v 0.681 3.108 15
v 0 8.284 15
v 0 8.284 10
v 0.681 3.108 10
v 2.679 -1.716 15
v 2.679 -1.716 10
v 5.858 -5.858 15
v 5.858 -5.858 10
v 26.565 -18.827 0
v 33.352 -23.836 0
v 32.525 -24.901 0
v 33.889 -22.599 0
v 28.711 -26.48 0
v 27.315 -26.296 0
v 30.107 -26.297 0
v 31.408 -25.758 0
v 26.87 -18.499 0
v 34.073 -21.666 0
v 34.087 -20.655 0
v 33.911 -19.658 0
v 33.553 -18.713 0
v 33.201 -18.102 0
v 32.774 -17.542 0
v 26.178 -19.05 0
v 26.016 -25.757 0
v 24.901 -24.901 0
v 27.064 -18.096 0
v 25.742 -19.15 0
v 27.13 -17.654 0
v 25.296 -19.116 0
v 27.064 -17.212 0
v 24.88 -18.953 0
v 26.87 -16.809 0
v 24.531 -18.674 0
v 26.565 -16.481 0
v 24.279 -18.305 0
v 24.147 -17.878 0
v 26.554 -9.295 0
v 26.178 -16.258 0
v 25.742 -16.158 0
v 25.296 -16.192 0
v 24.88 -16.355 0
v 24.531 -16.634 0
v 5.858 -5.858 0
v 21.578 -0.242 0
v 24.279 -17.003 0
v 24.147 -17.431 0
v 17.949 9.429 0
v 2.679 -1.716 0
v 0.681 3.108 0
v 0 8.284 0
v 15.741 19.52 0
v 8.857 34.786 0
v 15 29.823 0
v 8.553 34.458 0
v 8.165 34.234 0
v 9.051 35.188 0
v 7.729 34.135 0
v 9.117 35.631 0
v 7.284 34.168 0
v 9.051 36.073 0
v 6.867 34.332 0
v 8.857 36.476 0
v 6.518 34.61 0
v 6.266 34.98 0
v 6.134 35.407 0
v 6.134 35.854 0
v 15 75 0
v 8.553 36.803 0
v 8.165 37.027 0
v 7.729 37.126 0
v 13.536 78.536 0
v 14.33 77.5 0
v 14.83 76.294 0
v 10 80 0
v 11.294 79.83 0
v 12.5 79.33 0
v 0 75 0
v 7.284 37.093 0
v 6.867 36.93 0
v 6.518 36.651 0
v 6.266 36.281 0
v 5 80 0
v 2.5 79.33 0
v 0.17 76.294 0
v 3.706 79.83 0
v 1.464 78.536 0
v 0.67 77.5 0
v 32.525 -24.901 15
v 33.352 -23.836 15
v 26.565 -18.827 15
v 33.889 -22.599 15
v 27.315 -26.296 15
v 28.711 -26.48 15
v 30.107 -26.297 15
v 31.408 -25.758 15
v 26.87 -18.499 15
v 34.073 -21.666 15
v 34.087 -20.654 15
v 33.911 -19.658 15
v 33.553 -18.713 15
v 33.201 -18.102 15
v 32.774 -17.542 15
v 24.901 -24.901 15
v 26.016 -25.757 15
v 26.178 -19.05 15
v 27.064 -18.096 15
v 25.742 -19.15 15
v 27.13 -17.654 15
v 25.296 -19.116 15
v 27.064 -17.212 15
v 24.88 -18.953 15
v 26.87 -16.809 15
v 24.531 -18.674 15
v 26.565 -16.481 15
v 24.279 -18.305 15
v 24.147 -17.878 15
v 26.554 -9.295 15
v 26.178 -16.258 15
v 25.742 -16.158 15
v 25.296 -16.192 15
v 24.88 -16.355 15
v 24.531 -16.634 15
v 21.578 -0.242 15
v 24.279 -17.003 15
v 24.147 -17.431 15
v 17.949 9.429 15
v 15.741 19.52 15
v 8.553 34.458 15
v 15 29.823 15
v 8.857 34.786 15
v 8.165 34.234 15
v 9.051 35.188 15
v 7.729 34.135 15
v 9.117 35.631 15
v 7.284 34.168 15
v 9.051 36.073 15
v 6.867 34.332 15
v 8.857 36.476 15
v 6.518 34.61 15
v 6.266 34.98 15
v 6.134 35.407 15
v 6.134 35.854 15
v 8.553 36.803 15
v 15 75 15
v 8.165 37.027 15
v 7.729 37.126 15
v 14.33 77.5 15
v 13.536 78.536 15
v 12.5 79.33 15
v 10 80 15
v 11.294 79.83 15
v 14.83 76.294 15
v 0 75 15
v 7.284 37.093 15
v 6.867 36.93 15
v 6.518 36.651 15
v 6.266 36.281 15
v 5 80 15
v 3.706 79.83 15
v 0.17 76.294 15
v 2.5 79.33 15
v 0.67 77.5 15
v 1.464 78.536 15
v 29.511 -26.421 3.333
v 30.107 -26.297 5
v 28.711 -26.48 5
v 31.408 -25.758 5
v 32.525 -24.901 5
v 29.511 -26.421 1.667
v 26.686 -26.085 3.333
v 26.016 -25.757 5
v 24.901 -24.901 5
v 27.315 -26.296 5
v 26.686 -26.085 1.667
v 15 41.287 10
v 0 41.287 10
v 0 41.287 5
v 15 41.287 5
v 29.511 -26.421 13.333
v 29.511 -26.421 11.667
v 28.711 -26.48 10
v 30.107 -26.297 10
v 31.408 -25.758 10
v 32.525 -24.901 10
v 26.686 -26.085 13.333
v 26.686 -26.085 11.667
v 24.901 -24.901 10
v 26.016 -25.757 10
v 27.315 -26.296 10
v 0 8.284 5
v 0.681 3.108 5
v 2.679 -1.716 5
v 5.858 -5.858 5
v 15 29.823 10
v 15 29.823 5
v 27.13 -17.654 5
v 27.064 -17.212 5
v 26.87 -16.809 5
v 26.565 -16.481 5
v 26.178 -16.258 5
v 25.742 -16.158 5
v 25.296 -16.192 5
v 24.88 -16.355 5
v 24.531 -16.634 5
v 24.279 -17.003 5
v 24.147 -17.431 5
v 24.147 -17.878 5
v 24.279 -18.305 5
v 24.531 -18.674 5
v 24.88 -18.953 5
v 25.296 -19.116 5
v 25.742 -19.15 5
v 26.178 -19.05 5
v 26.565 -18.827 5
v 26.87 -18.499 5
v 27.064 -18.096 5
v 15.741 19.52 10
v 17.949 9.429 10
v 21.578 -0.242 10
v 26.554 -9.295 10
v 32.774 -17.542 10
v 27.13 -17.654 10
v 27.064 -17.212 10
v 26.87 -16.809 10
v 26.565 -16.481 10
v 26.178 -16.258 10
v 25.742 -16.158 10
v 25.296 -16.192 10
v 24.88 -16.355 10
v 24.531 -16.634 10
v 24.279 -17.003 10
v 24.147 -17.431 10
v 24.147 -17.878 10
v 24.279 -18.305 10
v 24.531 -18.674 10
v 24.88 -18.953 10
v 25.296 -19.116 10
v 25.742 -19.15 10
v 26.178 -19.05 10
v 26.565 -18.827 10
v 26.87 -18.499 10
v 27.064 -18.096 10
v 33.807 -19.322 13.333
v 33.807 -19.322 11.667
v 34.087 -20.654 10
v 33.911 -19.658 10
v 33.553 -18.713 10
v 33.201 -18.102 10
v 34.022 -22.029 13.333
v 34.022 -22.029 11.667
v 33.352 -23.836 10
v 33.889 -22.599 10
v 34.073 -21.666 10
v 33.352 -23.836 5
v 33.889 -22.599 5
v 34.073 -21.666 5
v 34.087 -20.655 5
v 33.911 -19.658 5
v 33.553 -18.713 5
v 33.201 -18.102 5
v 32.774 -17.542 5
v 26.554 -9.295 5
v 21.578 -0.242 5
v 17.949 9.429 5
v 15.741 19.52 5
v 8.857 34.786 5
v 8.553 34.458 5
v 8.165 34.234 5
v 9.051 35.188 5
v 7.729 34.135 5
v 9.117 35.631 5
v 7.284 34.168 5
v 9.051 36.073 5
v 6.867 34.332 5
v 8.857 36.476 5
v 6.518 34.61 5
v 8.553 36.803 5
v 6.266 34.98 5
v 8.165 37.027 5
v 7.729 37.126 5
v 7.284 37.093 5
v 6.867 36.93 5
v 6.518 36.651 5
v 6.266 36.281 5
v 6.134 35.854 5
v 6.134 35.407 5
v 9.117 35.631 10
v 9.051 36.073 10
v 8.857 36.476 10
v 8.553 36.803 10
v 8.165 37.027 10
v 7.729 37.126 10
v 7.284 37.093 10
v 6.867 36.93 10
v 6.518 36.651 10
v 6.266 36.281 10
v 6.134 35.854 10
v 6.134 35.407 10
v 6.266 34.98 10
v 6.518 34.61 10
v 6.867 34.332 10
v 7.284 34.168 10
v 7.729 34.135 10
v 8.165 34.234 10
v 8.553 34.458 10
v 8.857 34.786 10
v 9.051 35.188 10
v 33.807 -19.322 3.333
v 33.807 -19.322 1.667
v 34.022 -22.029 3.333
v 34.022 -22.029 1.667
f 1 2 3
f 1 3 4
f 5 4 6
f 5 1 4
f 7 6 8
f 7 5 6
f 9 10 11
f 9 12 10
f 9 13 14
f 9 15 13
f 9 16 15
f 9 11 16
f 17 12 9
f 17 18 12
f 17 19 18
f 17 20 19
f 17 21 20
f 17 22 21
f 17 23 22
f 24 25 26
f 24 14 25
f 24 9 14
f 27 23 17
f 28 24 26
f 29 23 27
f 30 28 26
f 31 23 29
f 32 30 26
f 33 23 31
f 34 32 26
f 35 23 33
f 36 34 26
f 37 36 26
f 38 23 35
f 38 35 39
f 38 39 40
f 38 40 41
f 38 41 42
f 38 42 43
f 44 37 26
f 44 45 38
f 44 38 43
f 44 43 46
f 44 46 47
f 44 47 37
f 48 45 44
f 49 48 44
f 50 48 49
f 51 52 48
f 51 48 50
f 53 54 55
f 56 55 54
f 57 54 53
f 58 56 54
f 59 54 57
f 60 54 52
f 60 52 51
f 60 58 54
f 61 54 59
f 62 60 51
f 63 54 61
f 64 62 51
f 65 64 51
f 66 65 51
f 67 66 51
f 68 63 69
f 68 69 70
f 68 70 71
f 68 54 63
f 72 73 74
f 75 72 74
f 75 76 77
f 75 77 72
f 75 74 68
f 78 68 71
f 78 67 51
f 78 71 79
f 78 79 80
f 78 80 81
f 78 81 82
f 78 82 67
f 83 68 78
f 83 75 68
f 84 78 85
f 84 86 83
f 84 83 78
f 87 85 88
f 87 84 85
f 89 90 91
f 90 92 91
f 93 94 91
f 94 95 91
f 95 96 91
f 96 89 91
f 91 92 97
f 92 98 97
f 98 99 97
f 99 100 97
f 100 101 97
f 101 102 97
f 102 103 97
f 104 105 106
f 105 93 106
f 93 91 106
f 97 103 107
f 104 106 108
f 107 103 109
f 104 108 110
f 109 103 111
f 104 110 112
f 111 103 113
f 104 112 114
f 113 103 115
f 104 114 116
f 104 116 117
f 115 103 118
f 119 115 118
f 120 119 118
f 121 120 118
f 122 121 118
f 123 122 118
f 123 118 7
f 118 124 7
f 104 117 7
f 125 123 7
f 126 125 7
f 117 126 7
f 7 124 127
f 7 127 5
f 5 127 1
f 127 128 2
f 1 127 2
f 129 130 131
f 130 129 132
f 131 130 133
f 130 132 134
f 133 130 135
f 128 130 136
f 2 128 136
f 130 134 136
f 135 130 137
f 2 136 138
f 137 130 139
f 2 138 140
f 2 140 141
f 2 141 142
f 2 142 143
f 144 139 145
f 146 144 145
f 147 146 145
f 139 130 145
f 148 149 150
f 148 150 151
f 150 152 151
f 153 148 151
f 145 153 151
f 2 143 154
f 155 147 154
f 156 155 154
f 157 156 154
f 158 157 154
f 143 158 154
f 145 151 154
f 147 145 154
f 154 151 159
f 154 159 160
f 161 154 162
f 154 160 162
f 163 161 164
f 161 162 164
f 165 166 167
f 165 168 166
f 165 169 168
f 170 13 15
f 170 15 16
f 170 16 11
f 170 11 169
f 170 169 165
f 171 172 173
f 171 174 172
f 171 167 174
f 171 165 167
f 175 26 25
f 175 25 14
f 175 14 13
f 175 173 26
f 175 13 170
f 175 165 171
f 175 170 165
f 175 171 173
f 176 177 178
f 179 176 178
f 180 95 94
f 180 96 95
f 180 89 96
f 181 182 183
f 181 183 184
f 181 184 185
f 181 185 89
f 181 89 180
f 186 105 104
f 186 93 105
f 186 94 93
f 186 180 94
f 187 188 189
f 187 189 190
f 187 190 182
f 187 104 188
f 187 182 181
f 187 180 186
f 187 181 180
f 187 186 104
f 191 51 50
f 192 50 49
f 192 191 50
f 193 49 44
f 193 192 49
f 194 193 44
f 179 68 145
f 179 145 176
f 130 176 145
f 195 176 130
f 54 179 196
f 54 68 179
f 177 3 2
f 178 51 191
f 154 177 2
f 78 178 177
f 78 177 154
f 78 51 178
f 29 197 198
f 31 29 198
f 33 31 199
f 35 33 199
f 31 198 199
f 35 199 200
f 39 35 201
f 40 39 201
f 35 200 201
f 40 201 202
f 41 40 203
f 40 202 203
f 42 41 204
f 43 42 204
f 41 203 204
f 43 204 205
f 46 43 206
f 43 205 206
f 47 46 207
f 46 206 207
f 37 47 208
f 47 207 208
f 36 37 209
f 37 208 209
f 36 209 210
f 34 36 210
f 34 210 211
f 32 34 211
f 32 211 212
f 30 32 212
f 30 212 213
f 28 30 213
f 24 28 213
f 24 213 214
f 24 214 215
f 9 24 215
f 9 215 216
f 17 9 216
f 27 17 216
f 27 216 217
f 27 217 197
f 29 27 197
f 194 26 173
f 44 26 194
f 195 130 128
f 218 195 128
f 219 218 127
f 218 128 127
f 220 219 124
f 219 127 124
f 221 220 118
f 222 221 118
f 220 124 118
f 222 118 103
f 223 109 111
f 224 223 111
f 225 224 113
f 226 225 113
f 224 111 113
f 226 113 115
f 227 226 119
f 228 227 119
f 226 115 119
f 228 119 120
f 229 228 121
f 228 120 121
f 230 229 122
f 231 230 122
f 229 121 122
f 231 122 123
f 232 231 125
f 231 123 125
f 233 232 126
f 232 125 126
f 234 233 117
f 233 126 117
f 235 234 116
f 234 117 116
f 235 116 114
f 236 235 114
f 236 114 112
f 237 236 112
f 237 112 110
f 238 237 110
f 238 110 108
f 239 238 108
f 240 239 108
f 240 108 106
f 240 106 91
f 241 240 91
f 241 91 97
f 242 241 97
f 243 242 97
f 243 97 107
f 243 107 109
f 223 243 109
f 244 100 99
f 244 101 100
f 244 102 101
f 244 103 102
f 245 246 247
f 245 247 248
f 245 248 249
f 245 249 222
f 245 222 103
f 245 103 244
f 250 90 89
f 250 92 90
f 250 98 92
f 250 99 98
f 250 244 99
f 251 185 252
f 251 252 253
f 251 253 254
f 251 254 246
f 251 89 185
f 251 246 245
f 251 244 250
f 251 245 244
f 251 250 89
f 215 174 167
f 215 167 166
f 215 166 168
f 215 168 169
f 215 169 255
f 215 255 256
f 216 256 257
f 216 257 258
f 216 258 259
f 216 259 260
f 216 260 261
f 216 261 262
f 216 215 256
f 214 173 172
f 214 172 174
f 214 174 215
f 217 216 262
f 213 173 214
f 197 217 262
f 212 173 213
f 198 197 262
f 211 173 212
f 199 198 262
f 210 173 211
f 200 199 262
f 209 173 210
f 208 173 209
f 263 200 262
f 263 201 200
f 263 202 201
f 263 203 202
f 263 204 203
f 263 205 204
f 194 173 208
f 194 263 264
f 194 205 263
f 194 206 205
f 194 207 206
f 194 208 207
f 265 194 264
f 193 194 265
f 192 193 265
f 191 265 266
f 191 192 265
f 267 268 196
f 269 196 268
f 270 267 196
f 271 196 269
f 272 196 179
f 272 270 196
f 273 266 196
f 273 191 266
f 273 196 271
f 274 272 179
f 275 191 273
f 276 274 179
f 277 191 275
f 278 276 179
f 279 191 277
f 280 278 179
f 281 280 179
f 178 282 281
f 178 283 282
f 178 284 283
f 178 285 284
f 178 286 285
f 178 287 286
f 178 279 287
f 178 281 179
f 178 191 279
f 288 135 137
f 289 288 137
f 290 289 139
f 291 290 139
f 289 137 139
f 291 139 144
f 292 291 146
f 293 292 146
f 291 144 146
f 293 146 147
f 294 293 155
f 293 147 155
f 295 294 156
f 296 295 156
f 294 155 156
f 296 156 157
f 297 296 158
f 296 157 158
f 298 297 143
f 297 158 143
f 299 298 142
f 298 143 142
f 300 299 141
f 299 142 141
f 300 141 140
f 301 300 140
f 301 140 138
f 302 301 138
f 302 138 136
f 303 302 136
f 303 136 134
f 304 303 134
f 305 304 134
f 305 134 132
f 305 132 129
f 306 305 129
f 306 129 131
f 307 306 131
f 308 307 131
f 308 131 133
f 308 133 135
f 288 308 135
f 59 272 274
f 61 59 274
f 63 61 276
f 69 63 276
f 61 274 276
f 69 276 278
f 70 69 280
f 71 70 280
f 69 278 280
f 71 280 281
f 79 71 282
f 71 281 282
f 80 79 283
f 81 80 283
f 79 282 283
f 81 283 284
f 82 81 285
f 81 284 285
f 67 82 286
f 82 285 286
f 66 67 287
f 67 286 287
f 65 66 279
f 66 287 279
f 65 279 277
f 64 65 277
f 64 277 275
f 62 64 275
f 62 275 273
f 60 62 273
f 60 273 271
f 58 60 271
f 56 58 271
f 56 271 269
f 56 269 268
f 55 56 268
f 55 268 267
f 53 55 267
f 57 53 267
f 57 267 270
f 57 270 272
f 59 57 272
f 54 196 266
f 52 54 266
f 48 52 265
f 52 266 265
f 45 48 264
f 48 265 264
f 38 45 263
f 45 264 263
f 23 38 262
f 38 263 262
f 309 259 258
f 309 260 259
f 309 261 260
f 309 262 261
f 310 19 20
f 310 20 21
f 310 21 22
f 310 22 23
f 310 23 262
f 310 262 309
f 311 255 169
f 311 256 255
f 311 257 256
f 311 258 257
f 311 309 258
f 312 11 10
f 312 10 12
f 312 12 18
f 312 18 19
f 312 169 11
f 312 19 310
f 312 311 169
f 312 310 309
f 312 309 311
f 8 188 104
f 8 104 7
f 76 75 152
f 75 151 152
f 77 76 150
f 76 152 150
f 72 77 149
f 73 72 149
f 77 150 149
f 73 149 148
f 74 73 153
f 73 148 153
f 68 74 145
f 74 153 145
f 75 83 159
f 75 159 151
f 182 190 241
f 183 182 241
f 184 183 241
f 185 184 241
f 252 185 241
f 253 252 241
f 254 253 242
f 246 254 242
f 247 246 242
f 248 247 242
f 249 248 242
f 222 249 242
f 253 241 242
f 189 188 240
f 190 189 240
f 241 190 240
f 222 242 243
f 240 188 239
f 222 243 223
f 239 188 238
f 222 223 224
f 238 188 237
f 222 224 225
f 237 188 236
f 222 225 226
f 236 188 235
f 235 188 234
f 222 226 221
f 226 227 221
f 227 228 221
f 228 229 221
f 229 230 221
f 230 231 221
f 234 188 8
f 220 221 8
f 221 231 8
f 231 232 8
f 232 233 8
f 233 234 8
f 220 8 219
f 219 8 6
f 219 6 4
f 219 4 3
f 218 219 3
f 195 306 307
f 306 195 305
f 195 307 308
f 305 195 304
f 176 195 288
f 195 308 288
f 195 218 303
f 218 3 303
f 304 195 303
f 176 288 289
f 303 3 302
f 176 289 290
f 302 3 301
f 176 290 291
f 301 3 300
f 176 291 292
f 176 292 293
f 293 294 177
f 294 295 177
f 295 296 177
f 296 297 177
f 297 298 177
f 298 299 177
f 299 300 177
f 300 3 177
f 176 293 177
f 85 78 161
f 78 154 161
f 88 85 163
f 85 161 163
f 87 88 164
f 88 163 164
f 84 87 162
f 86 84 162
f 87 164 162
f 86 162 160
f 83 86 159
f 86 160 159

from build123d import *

# Parameters (mm, degrees)
BOSS_EXTRU_1_DEPTH      = 15
CONG_1_R                = 72
CONG_2_R                = 20
ESQUISSE2_W             = 5
ESQUISSE2_H             = 70
ENL_V_MAT_EXTRU_1_DEPTH = 90.086452972
ESQUISSE3_R             = 1.5
ENL_V_MAT_EXTRU_2_DEPTH = 90.086452972
CONG_3_R                = 5
CONG_4_START            = 9
CONG_4_DEPTH            = 7
CONG_5_START            = -1
CONG_5_DEPTH            = 7


with BuildPart() as part:
    # Esquisse1 → Boss.-Extru.1 (new body)
    with BuildSketch(Plane.XY):
        Polygon((0, 0), (0, 80), (15, 80), (15, 0), (36.213203436, -21.213203436), (28.713203436, -28.713203436), align=None)
    extrude(amount=BOSS_EXTRU_1_DEPTH)

    # Congé1
    cong_1_edges = [part.edges().sort_by_distance(p)[0] for p in [
        (15, 0, 7.5),
    ]]
    fillet(cong_1_edges, radius=CONG_1_R)

    # Congé2
    cong_2_edges = [part.edges().sort_by_distance(p)[0] for p in [
        (0, 0, 7.5),
    ]]
    fillet(cong_2_edges, radius=CONG_2_R)

    # Esquisse2 → Enlèv. mat.-Extru.1 (cut, through all)
    with BuildSketch(Plane(origin=(0, 0, 0), x_dir=(0, 0, -1), z_dir=(1, 0, 0))):
        with Locations((-7.5, 6.286796564)):
            Rectangle(ESQUISSE2_W, ESQUISSE2_H)
    extrude(amount=ENL_V_MAT_EXTRU_1_DEPTH, mode=Mode.SUBTRACT)

    # Esquisse3 → Enlèv. mat.-Extru.2 (cut, through all)
    with BuildSketch(Plane.XY.offset(15)):
        with Locations((7.61728785, 35.6306026)):
            Circle(ESQUISSE3_R)
        with Locations((25.630175336, -17.654095912)):
            Circle(ESQUISSE3_R)
    extrude(amount=-ENL_V_MAT_EXTRU_2_DEPTH, mode=Mode.SUBTRACT)

    # Congé3
    cong_3_edges = [part.edges().sort_by_distance(p)[0] for p in [
        (0, 80, 7.5),
        (15, 80, 7.5),
    ]]
    fillet(cong_3_edges, radius=CONG_3_R)

    # Congé4: read off the stored shape, not the designer's step
    # Congé4 outline → Congé4 (cut)
    with BuildSketch(Plane.XY.offset(CONG_4_START)):
        with BuildLine():
            ThreePointArc((36.088311756, -21.088311756), (34.40105692, -19.343189251), (32.773587535, -17.542182633))
            add(Edge.make_bspline(
                [(32.773587535, -17.542182633), (34.472065544, -19.486683464), (34.913542675, -22.512864199), (32.525386467, -24.901020408)],
                knots=[0, 0, 0, 0, 0.49128121, 0.49128121, 0.49128121, 0.49128121], degree=3, weights=[1, 0.683519634, 0.522520126, 0.517001474]))
            Line((32.525386467, -24.901020408), (36.213203437, -21.213203437))
            Line((36.213203437, -21.213203437), (36.088311756, -21.088311756))
        make_face()
        with BuildLine():
            Line((28.713203437, -28.713203437), (32.525386467, -24.901020408))
            add(Edge.make_bspline(
                [(32.525386467, -24.901020408), (29.99813373, -27.428273144), (26.823045344, -26.823045346), (24.901020406, -24.901020406)],
                knots=[0.49128121, 0.49128121, 0.49128121, 0.49128121, 1, 1, 1, 1], degree=3, weights=[0.517001474, 0.511286943, 0.672286452, 1]))
            Line((24.901020406, -24.901020406), (28.713203437, -28.713203437))
        make_face()
    extrude(amount=CONG_4_DEPTH, mode=Mode.SUBTRACT)

    # Congé5: read off the stored shape, not the designer's step
    # Congé5 outline → Congé5 (cut)
    with BuildSketch(Plane.XY.offset(CONG_5_START)):
        with BuildLine():
            ThreePointArc((36.088311755, -21.088311755), (34.401056918, -19.343189249), (32.773587531, -17.542182629))
            add(Edge.make_bspline(
                [(32.773587531, -17.542182629), (34.472065541, -19.486683459), (34.913542673, -22.512864192), (32.525386468, -24.901020401)],
                knots=[0, 0, 0, 0, 0.49128121, 0.49128121, 0.49128121, 0.49128121], degree=3, weights=[1, 0.683519634, 0.522520126, 0.517001474]))
            Line((32.525386468, -24.901020401), (36.213203436, -21.213203436))
            Line((36.213203436, -21.213203436), (36.088311755, -21.088311755))
        make_face()
        with BuildLine():
            Line((28.713203436, -28.713203436), (32.525386468, -24.901020401))
            add(Edge.make_bspline(
                [(32.525386468, -24.901020401), (29.998133731, -27.428273143), (26.823045342, -26.823045344), (24.901020402, -24.901020402)],
                knots=[0.49128121, 0.49128121, 0.49128121, 0.49128121, 1, 1, 1, 1], degree=3, weights=[0.517001474, 0.511286943, 0.672286451, 1]))
            Line((24.901020402, -24.901020402), (28.713203436, -28.713203436))
        make_face()
    extrude(amount=CONG_5_DEPTH, mode=Mode.SUBTRACT)


solid = part.part
